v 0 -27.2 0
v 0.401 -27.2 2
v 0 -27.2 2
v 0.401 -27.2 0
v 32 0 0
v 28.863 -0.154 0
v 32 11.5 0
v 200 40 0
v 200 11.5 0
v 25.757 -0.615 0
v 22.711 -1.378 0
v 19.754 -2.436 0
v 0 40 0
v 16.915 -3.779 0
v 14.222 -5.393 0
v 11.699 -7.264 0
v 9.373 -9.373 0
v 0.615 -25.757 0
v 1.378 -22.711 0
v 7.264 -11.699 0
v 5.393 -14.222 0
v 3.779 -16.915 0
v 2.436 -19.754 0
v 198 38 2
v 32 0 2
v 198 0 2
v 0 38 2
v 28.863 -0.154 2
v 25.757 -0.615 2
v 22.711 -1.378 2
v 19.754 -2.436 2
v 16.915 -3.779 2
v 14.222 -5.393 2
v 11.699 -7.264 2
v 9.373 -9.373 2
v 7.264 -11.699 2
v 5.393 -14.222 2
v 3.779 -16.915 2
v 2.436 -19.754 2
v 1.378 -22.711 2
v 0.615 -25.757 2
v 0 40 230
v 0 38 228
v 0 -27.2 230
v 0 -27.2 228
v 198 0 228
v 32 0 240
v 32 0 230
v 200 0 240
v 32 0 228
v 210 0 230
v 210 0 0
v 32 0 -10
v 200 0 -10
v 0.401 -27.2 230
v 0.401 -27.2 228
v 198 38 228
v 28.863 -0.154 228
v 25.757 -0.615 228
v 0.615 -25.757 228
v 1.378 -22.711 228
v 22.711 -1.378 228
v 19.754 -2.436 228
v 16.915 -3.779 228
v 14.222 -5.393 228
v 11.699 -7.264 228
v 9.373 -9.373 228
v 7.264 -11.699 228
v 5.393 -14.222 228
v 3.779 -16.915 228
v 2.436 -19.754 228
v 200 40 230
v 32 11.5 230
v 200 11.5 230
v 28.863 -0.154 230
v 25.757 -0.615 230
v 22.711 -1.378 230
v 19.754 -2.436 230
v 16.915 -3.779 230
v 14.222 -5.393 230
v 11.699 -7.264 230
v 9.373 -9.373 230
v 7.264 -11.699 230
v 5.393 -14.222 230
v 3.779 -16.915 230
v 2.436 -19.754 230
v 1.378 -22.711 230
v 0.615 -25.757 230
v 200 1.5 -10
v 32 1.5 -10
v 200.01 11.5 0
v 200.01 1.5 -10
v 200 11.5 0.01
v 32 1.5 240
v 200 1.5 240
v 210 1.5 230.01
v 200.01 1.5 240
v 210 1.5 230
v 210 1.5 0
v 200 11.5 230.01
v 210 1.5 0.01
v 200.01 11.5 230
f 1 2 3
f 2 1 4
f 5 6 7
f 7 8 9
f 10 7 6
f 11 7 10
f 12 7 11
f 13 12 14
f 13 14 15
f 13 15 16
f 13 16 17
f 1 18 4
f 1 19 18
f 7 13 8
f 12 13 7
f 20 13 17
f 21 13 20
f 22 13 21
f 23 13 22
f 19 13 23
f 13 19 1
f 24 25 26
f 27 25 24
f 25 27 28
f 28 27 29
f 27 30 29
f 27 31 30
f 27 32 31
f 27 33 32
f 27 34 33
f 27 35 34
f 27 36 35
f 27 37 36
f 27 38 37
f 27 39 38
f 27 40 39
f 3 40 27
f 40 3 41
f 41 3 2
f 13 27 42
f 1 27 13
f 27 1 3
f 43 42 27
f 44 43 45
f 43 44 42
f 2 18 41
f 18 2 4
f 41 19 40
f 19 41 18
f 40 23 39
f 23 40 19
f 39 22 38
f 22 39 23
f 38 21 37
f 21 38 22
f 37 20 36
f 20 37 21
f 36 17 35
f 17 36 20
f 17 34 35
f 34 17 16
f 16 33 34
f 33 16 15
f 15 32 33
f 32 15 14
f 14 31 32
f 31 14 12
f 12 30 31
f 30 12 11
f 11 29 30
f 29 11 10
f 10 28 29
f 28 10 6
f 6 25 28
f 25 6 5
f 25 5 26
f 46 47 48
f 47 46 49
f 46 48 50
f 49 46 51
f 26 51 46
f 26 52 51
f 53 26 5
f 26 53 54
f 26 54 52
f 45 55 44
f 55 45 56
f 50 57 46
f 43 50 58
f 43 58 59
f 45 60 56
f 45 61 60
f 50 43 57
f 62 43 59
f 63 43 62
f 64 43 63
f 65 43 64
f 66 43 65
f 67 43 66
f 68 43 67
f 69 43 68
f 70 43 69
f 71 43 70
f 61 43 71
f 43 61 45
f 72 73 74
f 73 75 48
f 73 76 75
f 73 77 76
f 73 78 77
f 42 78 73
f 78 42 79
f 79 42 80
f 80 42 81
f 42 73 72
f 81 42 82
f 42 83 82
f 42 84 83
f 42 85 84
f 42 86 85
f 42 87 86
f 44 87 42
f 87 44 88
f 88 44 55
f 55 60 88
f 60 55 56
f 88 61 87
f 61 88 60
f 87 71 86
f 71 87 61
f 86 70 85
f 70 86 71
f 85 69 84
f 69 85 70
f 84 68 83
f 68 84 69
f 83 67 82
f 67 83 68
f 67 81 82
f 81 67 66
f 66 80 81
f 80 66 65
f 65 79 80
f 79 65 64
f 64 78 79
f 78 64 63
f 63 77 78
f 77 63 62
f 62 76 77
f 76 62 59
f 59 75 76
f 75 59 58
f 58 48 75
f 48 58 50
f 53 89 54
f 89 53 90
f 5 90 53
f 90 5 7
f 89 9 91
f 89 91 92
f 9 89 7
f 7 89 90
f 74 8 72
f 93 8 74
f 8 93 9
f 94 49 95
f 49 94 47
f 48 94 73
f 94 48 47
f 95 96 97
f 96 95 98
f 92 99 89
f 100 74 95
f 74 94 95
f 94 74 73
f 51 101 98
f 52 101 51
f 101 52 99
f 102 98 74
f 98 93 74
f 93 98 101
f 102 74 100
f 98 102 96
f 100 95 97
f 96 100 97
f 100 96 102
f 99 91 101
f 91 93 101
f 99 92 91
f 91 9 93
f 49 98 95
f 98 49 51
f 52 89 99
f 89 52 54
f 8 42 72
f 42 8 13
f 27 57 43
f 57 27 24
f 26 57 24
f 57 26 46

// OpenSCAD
/* [Box Dimensions] */
// Total outer depth of the box (mm, X axis)
depth = 200; // [10:5:500]

// Total outer width of the box (mm, Y axis)
width = 40; // [10:5:200]

// Total outer height of the box (mm, Z axis)
height = 230; // [10:5:500]

// Thickness of all walls (mm)
wall_thickness = 2; // [0.8:0.2:10]


/* [Corner Arc] */
// Radius of the corner arc and size of the corner square (mm)
arc_radius = 32; // [1:1:200]

// Percentage of arc radius to remove outer spike (%)
clip_percent = 15; // [0:1:100]

// Actual clipping distance
clip_amount = arc_radius * clip_percent / 100;


/* [Outer Rim] */
// Thickness of the rim (mm)
rim_thickness = 1.5; // [0.25:0.25:200]

// Width of the rim lip extending along the outer walls (mm)
rim_size = 10; // [1:0.5:100]

// Angle for support chamfers (45° or less is OK for modern printers)
support_angle = 45; // [10:5:60]


/* [Print Quality] */
// Smoothness of curved surfaces
$fn = 64; // [16, 32, 64, 128]


// ============================================================
// MAIN ASSEMBLY
// ============================================================

open_box_with_arc_corners();


module open_box_with_arc_corners() {

    union() {

        // 1. Bottom Wall
        cube([
            depth,
            width,
            wall_thickness
        ]);


        // 2. Top Wall
        translate([
            0,
            0,
            height - wall_thickness
        ])
            cube([
                depth,
                width,
                wall_thickness
            ]);


        // 3. Back Wall
        translate([
            0,
            width - wall_thickness,
            0
        ])
            cube([
                depth,
                wall_thickness,
                height
            ]);


        // 4. Right Wall
        translate([
            depth - wall_thickness,
            0,
            0
        ])
            cube([
                wall_thickness,
                width,
                height
            ]);


        // 5. Bottom Corner Arc Piece
        corner_arc_extension(
            arc_radius,
            wall_thickness
        );


        // 6. Top Corner Arc Piece
        translate([
            0,
            0,
            height - wall_thickness
        ])
            corner_arc_extension(
                arc_radius,
                wall_thickness
            );


        // 7. Outer Rim Assembly
        outer_rim();
    }
}


// ============================================================
// CORNER ARC GENERATOR
// ============================================================
//
// The original arc occupies:
//
//     X = 0 ... r
//     Y = -r ... 0
//
// The main box is on the +Y side.
//
// Therefore the side AWAY from the main box is:
//
//     Y = -r
//
// We clip that side with a BOX.
//
// Example:
//
//     r = 15
//     clip_percent = 10
//     clip_amount = 1.5
//
// Original Y range:
//
//     -15 ... 0
//
// New Y range:
//
//     -13.5 ... 0
//
// The X dimension is NOT shortened.
//
// ============================================================

module corner_arc_extension(r, t) {

    intersection() {

        // ====================================================
        // CLIPPING BOX
        // ====================================================
        //
        // Keep everything from:
        //
        //     Y = -r + clip_amount
        //
        // through:
        //
        //     Y = +infinity
        //
        // This removes the outer 10% of the extension on the
        // side away from the main box.
        //
        // X is deliberately oversized so it is NOT clipped.
        // Z is deliberately oversized so it is NOT clipped.
        // ====================================================

        translate([
            -1,
            -r + clip_amount,
            -1
        ])
            cube([
                r + 2,
                r + 2,
                t + 2
            ]);


        // ====================================================
        // ORIGINAL CORNER ARC
        // ====================================================

        linear_extrude(height = t) {

            rotate([0, 0, 90]) {

                difference() {

                    translate([
                        -r,
                        -r
                    ])
                        square([
                            r,
                            r
                        ],
                        center = false
                    );


                    translate([
                        -r,
                        -r
                    ])
                        circle(
                            r = r
                        );
                }
            }
        }
    }
}


// ============================================================
// COMPOUND MITER CORNER GENERATOR (TOP-REAR)
// ============================================================

module mitered_corner_wedge_hull_top(
    size_x,
    rim_thick,
    supp_base,
    size_z
) {

    hull() {

        // Horizontal profile at Z = height

        translate([
            0,
            0,
            0
        ])
            rotate([0, 90, 0])
                linear_extrude(height = 0.01)
                    polygon(points = [
                        [0, 0],
                        [0, rim_thick],
                        [-size_z, rim_thick],
                        [0, rim_thick + supp_base]
                    ]);


        // Vertical profile at X = depth

        translate([
            0,
            0,
            0
        ])
            linear_extrude(height = 0.01)
                polygon(points = [
                    [0, 0],
                    [0, rim_thick],
                    [size_x, rim_thick],
                    [0, rim_thick + supp_base]
                ]);
    }
}


// ============================================================
// COMPOUND MITER CORNER GENERATOR (BOTTOM-REAR)
// ============================================================

module mitered_corner_wedge_hull_bottom(
    size_x,
    rim_thick,
    supp_base,
    size_z
) {

    hull() {

        // Horizontal profile at Z = 0

        translate([
            0,
            0,
            0
        ])
            rotate([0, 90, 0])
                linear_extrude(height = 0.01)
                    polygon(points = [
                        [0, rim_thick],
                        [size_z, rim_thick],
                        [0, rim_thick + supp_base]
                    ]);


        // Vertical profile at X = depth

        translate([
            0,
            0,
            0
        ])
            linear_extrude(height = 0.01)
                polygon(points = [
                    [0, 0],
                    [0, rim_thick],
                    [size_x, rim_thick],
                    [0, rim_thick + supp_base]
                ]);
    }
}


// ============================================================
// OUTER RIM GENERATOR
// ============================================================

module outer_rim() {

    // Length of the support leg along the outer wall
    support_base = rim_size / tan(support_angle);


    union() {

        // ====================================================
        // 1. BOTTOM EDGE RIM & SUPPORT
        // ====================================================

        translate([
            arc_radius,
            0,
            -rim_size
        ])
            cube([
                depth - arc_radius,
                rim_thickness,
                rim_size
            ]);


        // Bottom wedge

        translate([
            arc_radius,
            0,
            0
        ])
            rotate([0, 90, 0])
                linear_extrude(
                    height = depth - arc_radius
                )
                    polygon(points = [
                        [0, rim_thickness],
                        [rim_size, rim_thickness],
                        [0, rim_thickness + support_base]
                    ]);


        // ====================================================
        // 2. TOP EDGE RIM & SUPPORT
        // ====================================================

        translate([
            arc_radius,
            0,
            height
        ])
            cube([
                depth - arc_radius,
                rim_thickness,
                rim_size
            ]);


        // Top wedge

        translate([
            arc_radius,
            0,
            0
        ])
            rotate([0, 90, 0])
                linear_extrude(
                    height = depth - arc_radius
                )
                    polygon(points = [
                        [-height, rim_thickness],
                        [-(height + rim_size), rim_thickness],
                        [-height, rim_thickness + support_base]
                    ]);


        // ====================================================
        // 3. BACK EDGE RIM & VERTICAL SUPPORT
        // ====================================================

        translate([
            depth,
            0,
            0
        ])
            cube([
                rim_size,
                rim_thickness,
                height
            ]);


        // Back vertical wedge

        linear_extrude(
            height = height
        )
            polygon(points = [
                [depth, rim_thickness],
                [depth + rim_size, rim_thickness],
                [depth, rim_thickness + support_base]
            ]);


        // ====================================================
        // 4. CORNER CAPS WITH MITERED TRANSITIONS
        // ====================================================

        // Top-Rear Corner Transition

        translate([
            depth,
            0,
            height
        ])
            mitered_corner_wedge_hull_top(
                rim_size,
                rim_thickness,
                support_base,
                rim_size
            );


        // Bottom-Rear Corner Transition

        translate([
            depth,
            0,
            0
        ])
            mitered_corner_wedge_hull_bottom(
                rim_size,
                rim_thickness,
                support_base,
                rim_size
            );


        // ====================================================
        // 5. FLAT TRIANGULAR RIM CORNER FILLERS
        // ====================================================

        // Top-Rear Rim Filler Triangle

        translate([
            depth,
            rim_thickness,
            height
        ])
            rotate([90, 0, 0])
                linear_extrude(
                    height = rim_thickness
                )
                    polygon(points = [
                        [0, 0],
                        [rim_size, 0],
                        [0, rim_size]
                    ]);


        // Bottom-Rear Rim Filler Triangle

        translate([
            depth,
            rim_thickness,
            0
        ])
            rotate([90, 0, 0])
                linear_extrude(
                    height = rim_thickness
                )
                    polygon(points = [
                        [0, 0],
                        [0, -rim_size],
                        [rim_size, 0]
                    ]);
    }
}
